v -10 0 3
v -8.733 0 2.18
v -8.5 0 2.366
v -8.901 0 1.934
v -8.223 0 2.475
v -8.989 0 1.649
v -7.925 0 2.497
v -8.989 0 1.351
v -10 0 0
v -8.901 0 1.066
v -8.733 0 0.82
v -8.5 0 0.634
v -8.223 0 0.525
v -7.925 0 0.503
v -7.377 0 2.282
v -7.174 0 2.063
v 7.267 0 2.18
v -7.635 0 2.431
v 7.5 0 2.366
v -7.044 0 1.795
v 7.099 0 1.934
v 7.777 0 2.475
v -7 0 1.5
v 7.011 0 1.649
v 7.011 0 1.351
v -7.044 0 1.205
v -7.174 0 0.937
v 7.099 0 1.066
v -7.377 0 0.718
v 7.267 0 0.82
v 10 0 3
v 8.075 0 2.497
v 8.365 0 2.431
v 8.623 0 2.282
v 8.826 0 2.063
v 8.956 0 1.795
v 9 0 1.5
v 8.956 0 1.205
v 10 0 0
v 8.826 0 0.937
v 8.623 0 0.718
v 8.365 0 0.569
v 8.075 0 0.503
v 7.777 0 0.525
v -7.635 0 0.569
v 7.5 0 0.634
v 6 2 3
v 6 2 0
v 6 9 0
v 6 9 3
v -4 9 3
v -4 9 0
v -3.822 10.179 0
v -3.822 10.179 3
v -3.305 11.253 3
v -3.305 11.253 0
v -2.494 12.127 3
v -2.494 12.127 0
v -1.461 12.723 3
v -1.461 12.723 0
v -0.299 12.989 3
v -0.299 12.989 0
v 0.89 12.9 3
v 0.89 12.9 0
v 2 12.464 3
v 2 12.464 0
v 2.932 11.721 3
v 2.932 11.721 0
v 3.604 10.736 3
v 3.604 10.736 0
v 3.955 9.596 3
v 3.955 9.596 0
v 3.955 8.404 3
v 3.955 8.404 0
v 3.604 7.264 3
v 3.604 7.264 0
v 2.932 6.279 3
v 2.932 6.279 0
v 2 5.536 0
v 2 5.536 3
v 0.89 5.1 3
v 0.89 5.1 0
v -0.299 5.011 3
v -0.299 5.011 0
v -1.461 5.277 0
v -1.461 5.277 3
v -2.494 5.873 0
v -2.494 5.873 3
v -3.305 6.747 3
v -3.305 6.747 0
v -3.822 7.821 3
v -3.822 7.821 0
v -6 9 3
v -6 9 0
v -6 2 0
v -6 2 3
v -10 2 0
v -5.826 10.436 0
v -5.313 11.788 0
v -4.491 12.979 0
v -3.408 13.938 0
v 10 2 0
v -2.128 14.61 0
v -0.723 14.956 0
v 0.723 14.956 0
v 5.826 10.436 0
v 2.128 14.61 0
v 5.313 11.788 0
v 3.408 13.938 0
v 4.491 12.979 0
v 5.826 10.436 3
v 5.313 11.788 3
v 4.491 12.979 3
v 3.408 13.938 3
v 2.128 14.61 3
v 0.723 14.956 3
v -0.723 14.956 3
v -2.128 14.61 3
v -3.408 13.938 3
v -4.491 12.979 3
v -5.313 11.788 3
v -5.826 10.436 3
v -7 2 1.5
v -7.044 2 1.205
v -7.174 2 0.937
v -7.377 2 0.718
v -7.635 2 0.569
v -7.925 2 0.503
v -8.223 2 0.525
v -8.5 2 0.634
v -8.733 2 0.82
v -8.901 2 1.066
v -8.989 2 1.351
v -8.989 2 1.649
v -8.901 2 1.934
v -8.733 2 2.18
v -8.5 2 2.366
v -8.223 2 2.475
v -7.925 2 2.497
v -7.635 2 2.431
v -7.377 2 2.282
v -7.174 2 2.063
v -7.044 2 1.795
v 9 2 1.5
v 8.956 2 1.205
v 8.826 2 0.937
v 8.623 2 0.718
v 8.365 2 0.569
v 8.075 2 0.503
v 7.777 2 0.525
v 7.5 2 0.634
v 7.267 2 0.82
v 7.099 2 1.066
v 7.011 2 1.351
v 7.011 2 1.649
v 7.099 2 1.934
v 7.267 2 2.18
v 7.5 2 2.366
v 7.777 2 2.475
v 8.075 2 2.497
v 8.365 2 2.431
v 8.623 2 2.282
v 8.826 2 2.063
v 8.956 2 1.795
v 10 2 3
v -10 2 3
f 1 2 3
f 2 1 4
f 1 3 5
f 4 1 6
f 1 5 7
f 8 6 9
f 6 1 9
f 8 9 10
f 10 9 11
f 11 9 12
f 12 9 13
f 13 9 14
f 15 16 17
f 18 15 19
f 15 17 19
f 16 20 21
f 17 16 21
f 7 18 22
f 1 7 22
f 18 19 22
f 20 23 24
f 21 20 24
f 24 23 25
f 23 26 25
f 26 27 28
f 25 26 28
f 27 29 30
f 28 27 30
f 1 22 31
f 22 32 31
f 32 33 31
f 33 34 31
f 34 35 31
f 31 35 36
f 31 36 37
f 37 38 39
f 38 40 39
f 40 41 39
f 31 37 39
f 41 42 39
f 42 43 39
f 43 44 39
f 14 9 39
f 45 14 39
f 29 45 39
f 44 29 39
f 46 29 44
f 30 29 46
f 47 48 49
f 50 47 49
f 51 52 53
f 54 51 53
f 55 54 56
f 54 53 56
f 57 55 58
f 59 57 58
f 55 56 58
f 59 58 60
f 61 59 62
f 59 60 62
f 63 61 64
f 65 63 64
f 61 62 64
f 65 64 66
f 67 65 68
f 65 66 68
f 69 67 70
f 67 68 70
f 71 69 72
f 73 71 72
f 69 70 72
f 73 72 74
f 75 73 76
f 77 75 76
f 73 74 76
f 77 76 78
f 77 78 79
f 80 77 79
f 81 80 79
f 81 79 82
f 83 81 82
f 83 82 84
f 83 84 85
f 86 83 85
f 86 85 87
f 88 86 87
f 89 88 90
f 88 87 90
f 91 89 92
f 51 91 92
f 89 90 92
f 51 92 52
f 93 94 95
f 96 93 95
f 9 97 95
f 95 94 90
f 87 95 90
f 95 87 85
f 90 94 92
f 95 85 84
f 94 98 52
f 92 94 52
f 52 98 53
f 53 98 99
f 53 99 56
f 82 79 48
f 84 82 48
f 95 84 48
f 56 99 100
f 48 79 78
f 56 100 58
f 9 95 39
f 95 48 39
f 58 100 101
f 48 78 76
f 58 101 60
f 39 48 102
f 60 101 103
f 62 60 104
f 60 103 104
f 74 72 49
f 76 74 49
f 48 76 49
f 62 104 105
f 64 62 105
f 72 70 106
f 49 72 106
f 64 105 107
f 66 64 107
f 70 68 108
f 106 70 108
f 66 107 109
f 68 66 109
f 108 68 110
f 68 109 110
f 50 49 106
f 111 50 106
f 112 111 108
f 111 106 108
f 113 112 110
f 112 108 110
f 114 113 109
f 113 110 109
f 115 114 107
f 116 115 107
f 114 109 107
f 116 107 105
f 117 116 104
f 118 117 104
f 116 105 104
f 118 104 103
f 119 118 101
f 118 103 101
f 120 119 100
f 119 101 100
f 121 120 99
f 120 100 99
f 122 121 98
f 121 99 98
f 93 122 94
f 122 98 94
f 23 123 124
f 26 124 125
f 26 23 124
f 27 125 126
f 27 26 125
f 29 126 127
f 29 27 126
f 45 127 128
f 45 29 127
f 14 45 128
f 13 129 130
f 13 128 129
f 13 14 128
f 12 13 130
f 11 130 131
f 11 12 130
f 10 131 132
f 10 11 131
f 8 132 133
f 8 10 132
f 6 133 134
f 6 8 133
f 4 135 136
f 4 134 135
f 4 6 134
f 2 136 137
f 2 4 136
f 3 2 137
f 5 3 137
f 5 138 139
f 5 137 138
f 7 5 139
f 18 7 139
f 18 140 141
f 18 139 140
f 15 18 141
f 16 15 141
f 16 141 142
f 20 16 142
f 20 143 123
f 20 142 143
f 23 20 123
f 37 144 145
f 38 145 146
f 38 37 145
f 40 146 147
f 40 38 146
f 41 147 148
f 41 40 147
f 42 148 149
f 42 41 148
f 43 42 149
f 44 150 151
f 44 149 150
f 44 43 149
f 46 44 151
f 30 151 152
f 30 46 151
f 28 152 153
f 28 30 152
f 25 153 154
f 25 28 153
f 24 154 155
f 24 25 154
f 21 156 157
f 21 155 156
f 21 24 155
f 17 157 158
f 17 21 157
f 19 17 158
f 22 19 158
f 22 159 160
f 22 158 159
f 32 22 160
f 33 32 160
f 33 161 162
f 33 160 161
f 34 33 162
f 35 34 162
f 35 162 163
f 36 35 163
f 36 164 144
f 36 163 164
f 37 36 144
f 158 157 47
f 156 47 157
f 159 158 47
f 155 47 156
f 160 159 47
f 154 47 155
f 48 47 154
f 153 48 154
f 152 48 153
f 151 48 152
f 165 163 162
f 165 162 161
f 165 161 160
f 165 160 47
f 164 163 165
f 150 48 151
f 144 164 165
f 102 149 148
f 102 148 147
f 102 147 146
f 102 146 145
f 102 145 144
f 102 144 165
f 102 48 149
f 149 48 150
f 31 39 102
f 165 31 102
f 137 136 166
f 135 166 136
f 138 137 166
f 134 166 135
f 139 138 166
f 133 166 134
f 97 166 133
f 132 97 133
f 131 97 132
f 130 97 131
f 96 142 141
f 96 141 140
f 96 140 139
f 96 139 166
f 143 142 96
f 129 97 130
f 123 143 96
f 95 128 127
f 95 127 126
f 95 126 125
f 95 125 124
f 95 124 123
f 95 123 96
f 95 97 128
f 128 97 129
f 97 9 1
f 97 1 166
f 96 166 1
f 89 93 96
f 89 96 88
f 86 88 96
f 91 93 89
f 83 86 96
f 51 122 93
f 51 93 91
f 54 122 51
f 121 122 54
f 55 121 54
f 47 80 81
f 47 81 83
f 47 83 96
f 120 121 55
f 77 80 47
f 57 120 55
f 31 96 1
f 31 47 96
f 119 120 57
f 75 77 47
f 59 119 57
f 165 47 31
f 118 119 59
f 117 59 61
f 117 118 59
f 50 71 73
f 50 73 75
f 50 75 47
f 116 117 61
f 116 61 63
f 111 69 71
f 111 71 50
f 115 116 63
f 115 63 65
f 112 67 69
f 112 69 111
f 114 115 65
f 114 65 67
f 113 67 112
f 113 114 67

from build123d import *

# Parameters (mm, degrees)
SKETCH1_W           = 20
SKETCH1_H           = 2
BOSS_EXTRUDE1_DEPTH = 3
SKETCH2_R           = 1
CUT_EXTRUDE1_DEPTH  = 16


with BuildPart() as part:
    # Sketch1 → Boss-Extrude1 (new body)
    with BuildSketch(Plane.XY):
        with Locations((0, 1)):
            Rectangle(SKETCH1_W, SKETCH1_H)
        with BuildLine():
            Line((-6, 9), (-6, 2))
            Line((-6, 2), (6, 2))
            Line((6, 2), (6, 9))
            ThreePointArc((6, 9), (0, 3), (-6, 9))
        make_face()
        with BuildLine():
            ThreePointArc((6, 9), (0, 15), (-6, 9))
            Line((-6, 9), (-4, 9))
            ThreePointArc((-4, 9), (0, 13), (4, 9))
            Line((4, 9), (6, 9))
        make_face()
        with BuildLine():
            Line((-4, 9), (-6, 9))
            ThreePointArc((-6, 9), (0, 3), (6, 9))
            Line((6, 9), (4, 9))
            ThreePointArc((4, 9), (0, 5), (-4, 9))
        make_face()
    extrude(amount=BOSS_EXTRUDE1_DEPTH)

    # Sketch2 → Cut-Extrude1 (cut, through all)
    with BuildSketch(Plane(origin=(0, 0, 0), x_dir=(1, 0, 0), z_dir=(0, 1, 0))):
        with Locations((-8, -1.5)):
            Circle(SKETCH2_R)
        with Locations((8, -1.5)):
            Circle(SKETCH2_R)
    extrude(amount=CUT_EXTRUDE1_DEPTH, mode=Mode.SUBTRACT)


solid = part.part
